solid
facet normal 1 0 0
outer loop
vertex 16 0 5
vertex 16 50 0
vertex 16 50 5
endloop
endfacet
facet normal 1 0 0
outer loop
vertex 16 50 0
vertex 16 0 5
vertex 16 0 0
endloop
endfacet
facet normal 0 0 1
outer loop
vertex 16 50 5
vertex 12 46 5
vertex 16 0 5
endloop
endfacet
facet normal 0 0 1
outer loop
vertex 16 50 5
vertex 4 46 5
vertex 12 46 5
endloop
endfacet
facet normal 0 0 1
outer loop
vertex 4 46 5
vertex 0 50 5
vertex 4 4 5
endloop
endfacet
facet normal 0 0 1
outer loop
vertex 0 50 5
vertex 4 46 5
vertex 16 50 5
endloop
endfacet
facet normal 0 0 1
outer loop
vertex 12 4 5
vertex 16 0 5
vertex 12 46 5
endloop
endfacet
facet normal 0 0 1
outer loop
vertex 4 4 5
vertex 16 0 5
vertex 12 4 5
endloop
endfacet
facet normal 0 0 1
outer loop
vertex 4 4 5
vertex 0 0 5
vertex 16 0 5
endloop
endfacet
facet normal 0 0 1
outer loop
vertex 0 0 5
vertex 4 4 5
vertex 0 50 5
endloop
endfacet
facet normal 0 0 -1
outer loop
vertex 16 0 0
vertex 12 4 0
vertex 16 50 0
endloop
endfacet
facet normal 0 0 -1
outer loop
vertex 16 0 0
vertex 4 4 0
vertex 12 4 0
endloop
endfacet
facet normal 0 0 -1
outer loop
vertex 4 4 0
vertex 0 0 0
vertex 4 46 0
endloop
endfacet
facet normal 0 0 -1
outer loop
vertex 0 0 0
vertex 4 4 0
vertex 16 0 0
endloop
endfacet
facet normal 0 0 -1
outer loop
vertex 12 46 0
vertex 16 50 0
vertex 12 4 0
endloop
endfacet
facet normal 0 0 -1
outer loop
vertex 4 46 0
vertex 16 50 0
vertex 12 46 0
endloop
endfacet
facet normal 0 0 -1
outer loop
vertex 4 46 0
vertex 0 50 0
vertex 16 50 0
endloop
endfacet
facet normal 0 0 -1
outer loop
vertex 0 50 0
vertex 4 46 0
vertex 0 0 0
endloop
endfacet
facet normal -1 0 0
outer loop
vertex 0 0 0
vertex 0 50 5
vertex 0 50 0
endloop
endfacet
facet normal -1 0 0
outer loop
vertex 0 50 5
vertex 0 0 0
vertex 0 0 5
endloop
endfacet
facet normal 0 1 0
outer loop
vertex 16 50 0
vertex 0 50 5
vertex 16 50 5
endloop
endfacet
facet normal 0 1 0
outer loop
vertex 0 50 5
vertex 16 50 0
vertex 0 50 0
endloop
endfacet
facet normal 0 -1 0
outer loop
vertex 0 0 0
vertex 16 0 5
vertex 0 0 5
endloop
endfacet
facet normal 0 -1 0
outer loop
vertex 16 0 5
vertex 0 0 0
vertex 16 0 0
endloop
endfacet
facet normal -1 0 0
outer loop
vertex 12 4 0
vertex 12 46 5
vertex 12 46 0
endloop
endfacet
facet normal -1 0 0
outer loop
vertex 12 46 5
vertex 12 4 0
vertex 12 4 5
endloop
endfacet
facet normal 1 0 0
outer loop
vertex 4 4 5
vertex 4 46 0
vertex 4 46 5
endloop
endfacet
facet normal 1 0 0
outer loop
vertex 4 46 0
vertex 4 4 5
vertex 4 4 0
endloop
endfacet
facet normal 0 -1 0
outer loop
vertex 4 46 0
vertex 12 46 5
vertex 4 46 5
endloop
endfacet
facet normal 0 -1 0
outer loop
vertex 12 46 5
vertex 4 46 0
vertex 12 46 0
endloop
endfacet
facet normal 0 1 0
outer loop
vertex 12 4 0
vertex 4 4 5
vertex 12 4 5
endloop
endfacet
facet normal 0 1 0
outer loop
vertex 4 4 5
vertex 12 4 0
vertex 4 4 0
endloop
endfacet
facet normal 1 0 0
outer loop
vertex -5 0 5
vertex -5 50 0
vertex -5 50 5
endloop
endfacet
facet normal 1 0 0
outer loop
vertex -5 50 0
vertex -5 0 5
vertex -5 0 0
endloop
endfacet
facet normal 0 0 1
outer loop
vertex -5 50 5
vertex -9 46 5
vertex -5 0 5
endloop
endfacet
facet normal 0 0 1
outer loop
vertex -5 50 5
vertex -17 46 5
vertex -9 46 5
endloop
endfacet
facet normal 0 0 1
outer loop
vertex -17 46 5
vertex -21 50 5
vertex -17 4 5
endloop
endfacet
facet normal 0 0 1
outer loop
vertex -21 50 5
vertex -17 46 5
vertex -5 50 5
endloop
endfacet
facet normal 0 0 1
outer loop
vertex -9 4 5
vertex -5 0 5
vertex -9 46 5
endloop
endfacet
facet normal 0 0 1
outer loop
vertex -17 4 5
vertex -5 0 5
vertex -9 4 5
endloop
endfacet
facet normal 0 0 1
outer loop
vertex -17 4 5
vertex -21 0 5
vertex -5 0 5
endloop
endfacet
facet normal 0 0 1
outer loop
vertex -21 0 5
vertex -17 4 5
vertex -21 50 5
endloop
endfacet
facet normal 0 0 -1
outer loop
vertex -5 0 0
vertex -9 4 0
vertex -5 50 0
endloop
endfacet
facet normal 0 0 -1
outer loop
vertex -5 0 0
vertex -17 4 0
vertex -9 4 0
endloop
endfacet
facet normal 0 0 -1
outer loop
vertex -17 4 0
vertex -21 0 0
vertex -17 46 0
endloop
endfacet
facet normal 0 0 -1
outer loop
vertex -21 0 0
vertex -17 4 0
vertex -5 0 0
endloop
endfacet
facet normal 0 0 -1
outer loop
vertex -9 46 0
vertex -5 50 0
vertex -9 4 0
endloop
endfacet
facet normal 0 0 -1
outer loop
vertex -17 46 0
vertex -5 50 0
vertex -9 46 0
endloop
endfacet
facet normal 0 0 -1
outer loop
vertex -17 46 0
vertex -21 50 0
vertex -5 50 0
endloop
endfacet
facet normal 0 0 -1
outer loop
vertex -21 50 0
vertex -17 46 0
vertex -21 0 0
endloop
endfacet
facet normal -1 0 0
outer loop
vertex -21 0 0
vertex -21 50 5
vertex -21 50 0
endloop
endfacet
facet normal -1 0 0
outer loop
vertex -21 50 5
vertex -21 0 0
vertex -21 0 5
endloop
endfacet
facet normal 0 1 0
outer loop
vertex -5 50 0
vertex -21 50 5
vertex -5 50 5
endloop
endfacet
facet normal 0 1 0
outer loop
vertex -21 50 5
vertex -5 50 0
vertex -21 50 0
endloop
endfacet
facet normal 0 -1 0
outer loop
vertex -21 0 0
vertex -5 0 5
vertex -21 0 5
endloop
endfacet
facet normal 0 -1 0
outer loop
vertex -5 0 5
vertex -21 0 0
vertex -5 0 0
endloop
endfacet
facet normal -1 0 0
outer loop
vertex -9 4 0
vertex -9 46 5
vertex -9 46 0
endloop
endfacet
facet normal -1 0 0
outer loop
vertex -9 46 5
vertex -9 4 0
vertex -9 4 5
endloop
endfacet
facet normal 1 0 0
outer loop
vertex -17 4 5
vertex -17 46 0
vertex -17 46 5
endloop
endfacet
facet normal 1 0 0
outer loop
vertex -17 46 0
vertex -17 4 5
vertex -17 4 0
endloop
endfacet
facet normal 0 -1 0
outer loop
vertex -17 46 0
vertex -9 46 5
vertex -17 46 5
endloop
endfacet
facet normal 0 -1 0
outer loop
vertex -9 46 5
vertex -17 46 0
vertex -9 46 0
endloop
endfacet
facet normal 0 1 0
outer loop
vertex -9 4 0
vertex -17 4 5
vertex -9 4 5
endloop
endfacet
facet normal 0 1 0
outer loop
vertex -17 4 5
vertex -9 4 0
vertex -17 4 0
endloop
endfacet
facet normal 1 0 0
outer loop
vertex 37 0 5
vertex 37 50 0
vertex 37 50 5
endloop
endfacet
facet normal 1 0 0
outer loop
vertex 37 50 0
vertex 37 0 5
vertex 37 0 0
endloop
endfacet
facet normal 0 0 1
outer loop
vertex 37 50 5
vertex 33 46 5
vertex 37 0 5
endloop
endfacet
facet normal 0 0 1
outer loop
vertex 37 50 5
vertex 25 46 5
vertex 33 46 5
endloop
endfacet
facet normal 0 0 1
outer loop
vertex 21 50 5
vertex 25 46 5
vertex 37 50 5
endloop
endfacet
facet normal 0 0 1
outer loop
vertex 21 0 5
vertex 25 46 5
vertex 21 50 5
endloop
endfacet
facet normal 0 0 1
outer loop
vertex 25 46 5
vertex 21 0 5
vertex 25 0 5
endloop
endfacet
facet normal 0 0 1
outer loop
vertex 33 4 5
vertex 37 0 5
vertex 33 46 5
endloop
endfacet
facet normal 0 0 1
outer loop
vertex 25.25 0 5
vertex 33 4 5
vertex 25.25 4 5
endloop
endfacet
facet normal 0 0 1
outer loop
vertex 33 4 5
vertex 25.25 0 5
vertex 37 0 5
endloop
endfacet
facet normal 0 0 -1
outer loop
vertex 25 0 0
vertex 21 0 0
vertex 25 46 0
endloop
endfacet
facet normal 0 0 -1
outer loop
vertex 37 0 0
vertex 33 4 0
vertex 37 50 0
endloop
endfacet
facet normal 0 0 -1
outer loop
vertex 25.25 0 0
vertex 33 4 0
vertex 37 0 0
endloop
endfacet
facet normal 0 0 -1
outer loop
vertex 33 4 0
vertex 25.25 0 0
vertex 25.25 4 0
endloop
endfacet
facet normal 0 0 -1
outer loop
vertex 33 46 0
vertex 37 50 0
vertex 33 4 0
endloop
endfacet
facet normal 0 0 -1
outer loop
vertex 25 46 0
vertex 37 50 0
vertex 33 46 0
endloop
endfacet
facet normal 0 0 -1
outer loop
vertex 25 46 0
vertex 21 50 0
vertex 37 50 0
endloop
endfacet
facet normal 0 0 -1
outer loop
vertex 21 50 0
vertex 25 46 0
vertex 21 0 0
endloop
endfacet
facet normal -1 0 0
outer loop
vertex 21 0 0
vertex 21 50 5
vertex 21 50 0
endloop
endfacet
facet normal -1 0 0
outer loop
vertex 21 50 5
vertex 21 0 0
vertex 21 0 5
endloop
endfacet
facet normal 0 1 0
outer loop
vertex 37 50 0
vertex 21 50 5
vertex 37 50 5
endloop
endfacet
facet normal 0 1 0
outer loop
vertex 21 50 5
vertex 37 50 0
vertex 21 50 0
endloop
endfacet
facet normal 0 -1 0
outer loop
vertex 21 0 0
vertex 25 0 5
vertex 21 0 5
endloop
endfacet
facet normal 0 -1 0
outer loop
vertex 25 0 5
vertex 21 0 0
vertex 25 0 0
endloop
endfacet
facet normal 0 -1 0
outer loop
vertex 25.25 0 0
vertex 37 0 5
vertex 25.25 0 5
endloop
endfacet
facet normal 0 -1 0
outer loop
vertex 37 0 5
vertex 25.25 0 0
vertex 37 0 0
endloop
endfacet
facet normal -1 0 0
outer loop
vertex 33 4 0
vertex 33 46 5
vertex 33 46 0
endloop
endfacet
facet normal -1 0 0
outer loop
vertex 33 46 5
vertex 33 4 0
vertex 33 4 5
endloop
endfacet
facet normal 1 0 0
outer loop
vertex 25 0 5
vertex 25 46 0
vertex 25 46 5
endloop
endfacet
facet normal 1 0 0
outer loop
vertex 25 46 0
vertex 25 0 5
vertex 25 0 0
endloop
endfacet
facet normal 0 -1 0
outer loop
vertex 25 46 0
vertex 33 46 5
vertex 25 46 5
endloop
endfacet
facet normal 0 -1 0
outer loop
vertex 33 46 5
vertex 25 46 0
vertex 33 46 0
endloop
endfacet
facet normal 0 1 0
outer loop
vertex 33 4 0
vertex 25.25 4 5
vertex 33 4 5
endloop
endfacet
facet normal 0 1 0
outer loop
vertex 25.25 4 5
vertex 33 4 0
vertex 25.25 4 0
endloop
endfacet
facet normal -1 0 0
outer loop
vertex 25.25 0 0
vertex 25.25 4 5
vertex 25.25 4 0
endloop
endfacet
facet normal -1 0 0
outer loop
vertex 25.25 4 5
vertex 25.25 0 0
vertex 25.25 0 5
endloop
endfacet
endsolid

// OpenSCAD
tolerance = 2;
width = 4;
height = 5;
length = 50;
breakSize = 0.25;

module ring(break=false) {
    render(convexity=2)
    difference() {
        cube([width*3+2*tolerance,length,height]);
        translate([width,width,-1])
        cube([width+2*tolerance,length-2*width,height+2]);
        if (break) {
            translate([width,-tolerance,-1])
            cube([breakSize,width+2*tolerance,height+2]);
        }
    }
}

translate([-2*tolerance-3*width-5,0,0])
ring();
ring();
translate([2*tolerance+3*width+5,0,0])
ring(break=true);
